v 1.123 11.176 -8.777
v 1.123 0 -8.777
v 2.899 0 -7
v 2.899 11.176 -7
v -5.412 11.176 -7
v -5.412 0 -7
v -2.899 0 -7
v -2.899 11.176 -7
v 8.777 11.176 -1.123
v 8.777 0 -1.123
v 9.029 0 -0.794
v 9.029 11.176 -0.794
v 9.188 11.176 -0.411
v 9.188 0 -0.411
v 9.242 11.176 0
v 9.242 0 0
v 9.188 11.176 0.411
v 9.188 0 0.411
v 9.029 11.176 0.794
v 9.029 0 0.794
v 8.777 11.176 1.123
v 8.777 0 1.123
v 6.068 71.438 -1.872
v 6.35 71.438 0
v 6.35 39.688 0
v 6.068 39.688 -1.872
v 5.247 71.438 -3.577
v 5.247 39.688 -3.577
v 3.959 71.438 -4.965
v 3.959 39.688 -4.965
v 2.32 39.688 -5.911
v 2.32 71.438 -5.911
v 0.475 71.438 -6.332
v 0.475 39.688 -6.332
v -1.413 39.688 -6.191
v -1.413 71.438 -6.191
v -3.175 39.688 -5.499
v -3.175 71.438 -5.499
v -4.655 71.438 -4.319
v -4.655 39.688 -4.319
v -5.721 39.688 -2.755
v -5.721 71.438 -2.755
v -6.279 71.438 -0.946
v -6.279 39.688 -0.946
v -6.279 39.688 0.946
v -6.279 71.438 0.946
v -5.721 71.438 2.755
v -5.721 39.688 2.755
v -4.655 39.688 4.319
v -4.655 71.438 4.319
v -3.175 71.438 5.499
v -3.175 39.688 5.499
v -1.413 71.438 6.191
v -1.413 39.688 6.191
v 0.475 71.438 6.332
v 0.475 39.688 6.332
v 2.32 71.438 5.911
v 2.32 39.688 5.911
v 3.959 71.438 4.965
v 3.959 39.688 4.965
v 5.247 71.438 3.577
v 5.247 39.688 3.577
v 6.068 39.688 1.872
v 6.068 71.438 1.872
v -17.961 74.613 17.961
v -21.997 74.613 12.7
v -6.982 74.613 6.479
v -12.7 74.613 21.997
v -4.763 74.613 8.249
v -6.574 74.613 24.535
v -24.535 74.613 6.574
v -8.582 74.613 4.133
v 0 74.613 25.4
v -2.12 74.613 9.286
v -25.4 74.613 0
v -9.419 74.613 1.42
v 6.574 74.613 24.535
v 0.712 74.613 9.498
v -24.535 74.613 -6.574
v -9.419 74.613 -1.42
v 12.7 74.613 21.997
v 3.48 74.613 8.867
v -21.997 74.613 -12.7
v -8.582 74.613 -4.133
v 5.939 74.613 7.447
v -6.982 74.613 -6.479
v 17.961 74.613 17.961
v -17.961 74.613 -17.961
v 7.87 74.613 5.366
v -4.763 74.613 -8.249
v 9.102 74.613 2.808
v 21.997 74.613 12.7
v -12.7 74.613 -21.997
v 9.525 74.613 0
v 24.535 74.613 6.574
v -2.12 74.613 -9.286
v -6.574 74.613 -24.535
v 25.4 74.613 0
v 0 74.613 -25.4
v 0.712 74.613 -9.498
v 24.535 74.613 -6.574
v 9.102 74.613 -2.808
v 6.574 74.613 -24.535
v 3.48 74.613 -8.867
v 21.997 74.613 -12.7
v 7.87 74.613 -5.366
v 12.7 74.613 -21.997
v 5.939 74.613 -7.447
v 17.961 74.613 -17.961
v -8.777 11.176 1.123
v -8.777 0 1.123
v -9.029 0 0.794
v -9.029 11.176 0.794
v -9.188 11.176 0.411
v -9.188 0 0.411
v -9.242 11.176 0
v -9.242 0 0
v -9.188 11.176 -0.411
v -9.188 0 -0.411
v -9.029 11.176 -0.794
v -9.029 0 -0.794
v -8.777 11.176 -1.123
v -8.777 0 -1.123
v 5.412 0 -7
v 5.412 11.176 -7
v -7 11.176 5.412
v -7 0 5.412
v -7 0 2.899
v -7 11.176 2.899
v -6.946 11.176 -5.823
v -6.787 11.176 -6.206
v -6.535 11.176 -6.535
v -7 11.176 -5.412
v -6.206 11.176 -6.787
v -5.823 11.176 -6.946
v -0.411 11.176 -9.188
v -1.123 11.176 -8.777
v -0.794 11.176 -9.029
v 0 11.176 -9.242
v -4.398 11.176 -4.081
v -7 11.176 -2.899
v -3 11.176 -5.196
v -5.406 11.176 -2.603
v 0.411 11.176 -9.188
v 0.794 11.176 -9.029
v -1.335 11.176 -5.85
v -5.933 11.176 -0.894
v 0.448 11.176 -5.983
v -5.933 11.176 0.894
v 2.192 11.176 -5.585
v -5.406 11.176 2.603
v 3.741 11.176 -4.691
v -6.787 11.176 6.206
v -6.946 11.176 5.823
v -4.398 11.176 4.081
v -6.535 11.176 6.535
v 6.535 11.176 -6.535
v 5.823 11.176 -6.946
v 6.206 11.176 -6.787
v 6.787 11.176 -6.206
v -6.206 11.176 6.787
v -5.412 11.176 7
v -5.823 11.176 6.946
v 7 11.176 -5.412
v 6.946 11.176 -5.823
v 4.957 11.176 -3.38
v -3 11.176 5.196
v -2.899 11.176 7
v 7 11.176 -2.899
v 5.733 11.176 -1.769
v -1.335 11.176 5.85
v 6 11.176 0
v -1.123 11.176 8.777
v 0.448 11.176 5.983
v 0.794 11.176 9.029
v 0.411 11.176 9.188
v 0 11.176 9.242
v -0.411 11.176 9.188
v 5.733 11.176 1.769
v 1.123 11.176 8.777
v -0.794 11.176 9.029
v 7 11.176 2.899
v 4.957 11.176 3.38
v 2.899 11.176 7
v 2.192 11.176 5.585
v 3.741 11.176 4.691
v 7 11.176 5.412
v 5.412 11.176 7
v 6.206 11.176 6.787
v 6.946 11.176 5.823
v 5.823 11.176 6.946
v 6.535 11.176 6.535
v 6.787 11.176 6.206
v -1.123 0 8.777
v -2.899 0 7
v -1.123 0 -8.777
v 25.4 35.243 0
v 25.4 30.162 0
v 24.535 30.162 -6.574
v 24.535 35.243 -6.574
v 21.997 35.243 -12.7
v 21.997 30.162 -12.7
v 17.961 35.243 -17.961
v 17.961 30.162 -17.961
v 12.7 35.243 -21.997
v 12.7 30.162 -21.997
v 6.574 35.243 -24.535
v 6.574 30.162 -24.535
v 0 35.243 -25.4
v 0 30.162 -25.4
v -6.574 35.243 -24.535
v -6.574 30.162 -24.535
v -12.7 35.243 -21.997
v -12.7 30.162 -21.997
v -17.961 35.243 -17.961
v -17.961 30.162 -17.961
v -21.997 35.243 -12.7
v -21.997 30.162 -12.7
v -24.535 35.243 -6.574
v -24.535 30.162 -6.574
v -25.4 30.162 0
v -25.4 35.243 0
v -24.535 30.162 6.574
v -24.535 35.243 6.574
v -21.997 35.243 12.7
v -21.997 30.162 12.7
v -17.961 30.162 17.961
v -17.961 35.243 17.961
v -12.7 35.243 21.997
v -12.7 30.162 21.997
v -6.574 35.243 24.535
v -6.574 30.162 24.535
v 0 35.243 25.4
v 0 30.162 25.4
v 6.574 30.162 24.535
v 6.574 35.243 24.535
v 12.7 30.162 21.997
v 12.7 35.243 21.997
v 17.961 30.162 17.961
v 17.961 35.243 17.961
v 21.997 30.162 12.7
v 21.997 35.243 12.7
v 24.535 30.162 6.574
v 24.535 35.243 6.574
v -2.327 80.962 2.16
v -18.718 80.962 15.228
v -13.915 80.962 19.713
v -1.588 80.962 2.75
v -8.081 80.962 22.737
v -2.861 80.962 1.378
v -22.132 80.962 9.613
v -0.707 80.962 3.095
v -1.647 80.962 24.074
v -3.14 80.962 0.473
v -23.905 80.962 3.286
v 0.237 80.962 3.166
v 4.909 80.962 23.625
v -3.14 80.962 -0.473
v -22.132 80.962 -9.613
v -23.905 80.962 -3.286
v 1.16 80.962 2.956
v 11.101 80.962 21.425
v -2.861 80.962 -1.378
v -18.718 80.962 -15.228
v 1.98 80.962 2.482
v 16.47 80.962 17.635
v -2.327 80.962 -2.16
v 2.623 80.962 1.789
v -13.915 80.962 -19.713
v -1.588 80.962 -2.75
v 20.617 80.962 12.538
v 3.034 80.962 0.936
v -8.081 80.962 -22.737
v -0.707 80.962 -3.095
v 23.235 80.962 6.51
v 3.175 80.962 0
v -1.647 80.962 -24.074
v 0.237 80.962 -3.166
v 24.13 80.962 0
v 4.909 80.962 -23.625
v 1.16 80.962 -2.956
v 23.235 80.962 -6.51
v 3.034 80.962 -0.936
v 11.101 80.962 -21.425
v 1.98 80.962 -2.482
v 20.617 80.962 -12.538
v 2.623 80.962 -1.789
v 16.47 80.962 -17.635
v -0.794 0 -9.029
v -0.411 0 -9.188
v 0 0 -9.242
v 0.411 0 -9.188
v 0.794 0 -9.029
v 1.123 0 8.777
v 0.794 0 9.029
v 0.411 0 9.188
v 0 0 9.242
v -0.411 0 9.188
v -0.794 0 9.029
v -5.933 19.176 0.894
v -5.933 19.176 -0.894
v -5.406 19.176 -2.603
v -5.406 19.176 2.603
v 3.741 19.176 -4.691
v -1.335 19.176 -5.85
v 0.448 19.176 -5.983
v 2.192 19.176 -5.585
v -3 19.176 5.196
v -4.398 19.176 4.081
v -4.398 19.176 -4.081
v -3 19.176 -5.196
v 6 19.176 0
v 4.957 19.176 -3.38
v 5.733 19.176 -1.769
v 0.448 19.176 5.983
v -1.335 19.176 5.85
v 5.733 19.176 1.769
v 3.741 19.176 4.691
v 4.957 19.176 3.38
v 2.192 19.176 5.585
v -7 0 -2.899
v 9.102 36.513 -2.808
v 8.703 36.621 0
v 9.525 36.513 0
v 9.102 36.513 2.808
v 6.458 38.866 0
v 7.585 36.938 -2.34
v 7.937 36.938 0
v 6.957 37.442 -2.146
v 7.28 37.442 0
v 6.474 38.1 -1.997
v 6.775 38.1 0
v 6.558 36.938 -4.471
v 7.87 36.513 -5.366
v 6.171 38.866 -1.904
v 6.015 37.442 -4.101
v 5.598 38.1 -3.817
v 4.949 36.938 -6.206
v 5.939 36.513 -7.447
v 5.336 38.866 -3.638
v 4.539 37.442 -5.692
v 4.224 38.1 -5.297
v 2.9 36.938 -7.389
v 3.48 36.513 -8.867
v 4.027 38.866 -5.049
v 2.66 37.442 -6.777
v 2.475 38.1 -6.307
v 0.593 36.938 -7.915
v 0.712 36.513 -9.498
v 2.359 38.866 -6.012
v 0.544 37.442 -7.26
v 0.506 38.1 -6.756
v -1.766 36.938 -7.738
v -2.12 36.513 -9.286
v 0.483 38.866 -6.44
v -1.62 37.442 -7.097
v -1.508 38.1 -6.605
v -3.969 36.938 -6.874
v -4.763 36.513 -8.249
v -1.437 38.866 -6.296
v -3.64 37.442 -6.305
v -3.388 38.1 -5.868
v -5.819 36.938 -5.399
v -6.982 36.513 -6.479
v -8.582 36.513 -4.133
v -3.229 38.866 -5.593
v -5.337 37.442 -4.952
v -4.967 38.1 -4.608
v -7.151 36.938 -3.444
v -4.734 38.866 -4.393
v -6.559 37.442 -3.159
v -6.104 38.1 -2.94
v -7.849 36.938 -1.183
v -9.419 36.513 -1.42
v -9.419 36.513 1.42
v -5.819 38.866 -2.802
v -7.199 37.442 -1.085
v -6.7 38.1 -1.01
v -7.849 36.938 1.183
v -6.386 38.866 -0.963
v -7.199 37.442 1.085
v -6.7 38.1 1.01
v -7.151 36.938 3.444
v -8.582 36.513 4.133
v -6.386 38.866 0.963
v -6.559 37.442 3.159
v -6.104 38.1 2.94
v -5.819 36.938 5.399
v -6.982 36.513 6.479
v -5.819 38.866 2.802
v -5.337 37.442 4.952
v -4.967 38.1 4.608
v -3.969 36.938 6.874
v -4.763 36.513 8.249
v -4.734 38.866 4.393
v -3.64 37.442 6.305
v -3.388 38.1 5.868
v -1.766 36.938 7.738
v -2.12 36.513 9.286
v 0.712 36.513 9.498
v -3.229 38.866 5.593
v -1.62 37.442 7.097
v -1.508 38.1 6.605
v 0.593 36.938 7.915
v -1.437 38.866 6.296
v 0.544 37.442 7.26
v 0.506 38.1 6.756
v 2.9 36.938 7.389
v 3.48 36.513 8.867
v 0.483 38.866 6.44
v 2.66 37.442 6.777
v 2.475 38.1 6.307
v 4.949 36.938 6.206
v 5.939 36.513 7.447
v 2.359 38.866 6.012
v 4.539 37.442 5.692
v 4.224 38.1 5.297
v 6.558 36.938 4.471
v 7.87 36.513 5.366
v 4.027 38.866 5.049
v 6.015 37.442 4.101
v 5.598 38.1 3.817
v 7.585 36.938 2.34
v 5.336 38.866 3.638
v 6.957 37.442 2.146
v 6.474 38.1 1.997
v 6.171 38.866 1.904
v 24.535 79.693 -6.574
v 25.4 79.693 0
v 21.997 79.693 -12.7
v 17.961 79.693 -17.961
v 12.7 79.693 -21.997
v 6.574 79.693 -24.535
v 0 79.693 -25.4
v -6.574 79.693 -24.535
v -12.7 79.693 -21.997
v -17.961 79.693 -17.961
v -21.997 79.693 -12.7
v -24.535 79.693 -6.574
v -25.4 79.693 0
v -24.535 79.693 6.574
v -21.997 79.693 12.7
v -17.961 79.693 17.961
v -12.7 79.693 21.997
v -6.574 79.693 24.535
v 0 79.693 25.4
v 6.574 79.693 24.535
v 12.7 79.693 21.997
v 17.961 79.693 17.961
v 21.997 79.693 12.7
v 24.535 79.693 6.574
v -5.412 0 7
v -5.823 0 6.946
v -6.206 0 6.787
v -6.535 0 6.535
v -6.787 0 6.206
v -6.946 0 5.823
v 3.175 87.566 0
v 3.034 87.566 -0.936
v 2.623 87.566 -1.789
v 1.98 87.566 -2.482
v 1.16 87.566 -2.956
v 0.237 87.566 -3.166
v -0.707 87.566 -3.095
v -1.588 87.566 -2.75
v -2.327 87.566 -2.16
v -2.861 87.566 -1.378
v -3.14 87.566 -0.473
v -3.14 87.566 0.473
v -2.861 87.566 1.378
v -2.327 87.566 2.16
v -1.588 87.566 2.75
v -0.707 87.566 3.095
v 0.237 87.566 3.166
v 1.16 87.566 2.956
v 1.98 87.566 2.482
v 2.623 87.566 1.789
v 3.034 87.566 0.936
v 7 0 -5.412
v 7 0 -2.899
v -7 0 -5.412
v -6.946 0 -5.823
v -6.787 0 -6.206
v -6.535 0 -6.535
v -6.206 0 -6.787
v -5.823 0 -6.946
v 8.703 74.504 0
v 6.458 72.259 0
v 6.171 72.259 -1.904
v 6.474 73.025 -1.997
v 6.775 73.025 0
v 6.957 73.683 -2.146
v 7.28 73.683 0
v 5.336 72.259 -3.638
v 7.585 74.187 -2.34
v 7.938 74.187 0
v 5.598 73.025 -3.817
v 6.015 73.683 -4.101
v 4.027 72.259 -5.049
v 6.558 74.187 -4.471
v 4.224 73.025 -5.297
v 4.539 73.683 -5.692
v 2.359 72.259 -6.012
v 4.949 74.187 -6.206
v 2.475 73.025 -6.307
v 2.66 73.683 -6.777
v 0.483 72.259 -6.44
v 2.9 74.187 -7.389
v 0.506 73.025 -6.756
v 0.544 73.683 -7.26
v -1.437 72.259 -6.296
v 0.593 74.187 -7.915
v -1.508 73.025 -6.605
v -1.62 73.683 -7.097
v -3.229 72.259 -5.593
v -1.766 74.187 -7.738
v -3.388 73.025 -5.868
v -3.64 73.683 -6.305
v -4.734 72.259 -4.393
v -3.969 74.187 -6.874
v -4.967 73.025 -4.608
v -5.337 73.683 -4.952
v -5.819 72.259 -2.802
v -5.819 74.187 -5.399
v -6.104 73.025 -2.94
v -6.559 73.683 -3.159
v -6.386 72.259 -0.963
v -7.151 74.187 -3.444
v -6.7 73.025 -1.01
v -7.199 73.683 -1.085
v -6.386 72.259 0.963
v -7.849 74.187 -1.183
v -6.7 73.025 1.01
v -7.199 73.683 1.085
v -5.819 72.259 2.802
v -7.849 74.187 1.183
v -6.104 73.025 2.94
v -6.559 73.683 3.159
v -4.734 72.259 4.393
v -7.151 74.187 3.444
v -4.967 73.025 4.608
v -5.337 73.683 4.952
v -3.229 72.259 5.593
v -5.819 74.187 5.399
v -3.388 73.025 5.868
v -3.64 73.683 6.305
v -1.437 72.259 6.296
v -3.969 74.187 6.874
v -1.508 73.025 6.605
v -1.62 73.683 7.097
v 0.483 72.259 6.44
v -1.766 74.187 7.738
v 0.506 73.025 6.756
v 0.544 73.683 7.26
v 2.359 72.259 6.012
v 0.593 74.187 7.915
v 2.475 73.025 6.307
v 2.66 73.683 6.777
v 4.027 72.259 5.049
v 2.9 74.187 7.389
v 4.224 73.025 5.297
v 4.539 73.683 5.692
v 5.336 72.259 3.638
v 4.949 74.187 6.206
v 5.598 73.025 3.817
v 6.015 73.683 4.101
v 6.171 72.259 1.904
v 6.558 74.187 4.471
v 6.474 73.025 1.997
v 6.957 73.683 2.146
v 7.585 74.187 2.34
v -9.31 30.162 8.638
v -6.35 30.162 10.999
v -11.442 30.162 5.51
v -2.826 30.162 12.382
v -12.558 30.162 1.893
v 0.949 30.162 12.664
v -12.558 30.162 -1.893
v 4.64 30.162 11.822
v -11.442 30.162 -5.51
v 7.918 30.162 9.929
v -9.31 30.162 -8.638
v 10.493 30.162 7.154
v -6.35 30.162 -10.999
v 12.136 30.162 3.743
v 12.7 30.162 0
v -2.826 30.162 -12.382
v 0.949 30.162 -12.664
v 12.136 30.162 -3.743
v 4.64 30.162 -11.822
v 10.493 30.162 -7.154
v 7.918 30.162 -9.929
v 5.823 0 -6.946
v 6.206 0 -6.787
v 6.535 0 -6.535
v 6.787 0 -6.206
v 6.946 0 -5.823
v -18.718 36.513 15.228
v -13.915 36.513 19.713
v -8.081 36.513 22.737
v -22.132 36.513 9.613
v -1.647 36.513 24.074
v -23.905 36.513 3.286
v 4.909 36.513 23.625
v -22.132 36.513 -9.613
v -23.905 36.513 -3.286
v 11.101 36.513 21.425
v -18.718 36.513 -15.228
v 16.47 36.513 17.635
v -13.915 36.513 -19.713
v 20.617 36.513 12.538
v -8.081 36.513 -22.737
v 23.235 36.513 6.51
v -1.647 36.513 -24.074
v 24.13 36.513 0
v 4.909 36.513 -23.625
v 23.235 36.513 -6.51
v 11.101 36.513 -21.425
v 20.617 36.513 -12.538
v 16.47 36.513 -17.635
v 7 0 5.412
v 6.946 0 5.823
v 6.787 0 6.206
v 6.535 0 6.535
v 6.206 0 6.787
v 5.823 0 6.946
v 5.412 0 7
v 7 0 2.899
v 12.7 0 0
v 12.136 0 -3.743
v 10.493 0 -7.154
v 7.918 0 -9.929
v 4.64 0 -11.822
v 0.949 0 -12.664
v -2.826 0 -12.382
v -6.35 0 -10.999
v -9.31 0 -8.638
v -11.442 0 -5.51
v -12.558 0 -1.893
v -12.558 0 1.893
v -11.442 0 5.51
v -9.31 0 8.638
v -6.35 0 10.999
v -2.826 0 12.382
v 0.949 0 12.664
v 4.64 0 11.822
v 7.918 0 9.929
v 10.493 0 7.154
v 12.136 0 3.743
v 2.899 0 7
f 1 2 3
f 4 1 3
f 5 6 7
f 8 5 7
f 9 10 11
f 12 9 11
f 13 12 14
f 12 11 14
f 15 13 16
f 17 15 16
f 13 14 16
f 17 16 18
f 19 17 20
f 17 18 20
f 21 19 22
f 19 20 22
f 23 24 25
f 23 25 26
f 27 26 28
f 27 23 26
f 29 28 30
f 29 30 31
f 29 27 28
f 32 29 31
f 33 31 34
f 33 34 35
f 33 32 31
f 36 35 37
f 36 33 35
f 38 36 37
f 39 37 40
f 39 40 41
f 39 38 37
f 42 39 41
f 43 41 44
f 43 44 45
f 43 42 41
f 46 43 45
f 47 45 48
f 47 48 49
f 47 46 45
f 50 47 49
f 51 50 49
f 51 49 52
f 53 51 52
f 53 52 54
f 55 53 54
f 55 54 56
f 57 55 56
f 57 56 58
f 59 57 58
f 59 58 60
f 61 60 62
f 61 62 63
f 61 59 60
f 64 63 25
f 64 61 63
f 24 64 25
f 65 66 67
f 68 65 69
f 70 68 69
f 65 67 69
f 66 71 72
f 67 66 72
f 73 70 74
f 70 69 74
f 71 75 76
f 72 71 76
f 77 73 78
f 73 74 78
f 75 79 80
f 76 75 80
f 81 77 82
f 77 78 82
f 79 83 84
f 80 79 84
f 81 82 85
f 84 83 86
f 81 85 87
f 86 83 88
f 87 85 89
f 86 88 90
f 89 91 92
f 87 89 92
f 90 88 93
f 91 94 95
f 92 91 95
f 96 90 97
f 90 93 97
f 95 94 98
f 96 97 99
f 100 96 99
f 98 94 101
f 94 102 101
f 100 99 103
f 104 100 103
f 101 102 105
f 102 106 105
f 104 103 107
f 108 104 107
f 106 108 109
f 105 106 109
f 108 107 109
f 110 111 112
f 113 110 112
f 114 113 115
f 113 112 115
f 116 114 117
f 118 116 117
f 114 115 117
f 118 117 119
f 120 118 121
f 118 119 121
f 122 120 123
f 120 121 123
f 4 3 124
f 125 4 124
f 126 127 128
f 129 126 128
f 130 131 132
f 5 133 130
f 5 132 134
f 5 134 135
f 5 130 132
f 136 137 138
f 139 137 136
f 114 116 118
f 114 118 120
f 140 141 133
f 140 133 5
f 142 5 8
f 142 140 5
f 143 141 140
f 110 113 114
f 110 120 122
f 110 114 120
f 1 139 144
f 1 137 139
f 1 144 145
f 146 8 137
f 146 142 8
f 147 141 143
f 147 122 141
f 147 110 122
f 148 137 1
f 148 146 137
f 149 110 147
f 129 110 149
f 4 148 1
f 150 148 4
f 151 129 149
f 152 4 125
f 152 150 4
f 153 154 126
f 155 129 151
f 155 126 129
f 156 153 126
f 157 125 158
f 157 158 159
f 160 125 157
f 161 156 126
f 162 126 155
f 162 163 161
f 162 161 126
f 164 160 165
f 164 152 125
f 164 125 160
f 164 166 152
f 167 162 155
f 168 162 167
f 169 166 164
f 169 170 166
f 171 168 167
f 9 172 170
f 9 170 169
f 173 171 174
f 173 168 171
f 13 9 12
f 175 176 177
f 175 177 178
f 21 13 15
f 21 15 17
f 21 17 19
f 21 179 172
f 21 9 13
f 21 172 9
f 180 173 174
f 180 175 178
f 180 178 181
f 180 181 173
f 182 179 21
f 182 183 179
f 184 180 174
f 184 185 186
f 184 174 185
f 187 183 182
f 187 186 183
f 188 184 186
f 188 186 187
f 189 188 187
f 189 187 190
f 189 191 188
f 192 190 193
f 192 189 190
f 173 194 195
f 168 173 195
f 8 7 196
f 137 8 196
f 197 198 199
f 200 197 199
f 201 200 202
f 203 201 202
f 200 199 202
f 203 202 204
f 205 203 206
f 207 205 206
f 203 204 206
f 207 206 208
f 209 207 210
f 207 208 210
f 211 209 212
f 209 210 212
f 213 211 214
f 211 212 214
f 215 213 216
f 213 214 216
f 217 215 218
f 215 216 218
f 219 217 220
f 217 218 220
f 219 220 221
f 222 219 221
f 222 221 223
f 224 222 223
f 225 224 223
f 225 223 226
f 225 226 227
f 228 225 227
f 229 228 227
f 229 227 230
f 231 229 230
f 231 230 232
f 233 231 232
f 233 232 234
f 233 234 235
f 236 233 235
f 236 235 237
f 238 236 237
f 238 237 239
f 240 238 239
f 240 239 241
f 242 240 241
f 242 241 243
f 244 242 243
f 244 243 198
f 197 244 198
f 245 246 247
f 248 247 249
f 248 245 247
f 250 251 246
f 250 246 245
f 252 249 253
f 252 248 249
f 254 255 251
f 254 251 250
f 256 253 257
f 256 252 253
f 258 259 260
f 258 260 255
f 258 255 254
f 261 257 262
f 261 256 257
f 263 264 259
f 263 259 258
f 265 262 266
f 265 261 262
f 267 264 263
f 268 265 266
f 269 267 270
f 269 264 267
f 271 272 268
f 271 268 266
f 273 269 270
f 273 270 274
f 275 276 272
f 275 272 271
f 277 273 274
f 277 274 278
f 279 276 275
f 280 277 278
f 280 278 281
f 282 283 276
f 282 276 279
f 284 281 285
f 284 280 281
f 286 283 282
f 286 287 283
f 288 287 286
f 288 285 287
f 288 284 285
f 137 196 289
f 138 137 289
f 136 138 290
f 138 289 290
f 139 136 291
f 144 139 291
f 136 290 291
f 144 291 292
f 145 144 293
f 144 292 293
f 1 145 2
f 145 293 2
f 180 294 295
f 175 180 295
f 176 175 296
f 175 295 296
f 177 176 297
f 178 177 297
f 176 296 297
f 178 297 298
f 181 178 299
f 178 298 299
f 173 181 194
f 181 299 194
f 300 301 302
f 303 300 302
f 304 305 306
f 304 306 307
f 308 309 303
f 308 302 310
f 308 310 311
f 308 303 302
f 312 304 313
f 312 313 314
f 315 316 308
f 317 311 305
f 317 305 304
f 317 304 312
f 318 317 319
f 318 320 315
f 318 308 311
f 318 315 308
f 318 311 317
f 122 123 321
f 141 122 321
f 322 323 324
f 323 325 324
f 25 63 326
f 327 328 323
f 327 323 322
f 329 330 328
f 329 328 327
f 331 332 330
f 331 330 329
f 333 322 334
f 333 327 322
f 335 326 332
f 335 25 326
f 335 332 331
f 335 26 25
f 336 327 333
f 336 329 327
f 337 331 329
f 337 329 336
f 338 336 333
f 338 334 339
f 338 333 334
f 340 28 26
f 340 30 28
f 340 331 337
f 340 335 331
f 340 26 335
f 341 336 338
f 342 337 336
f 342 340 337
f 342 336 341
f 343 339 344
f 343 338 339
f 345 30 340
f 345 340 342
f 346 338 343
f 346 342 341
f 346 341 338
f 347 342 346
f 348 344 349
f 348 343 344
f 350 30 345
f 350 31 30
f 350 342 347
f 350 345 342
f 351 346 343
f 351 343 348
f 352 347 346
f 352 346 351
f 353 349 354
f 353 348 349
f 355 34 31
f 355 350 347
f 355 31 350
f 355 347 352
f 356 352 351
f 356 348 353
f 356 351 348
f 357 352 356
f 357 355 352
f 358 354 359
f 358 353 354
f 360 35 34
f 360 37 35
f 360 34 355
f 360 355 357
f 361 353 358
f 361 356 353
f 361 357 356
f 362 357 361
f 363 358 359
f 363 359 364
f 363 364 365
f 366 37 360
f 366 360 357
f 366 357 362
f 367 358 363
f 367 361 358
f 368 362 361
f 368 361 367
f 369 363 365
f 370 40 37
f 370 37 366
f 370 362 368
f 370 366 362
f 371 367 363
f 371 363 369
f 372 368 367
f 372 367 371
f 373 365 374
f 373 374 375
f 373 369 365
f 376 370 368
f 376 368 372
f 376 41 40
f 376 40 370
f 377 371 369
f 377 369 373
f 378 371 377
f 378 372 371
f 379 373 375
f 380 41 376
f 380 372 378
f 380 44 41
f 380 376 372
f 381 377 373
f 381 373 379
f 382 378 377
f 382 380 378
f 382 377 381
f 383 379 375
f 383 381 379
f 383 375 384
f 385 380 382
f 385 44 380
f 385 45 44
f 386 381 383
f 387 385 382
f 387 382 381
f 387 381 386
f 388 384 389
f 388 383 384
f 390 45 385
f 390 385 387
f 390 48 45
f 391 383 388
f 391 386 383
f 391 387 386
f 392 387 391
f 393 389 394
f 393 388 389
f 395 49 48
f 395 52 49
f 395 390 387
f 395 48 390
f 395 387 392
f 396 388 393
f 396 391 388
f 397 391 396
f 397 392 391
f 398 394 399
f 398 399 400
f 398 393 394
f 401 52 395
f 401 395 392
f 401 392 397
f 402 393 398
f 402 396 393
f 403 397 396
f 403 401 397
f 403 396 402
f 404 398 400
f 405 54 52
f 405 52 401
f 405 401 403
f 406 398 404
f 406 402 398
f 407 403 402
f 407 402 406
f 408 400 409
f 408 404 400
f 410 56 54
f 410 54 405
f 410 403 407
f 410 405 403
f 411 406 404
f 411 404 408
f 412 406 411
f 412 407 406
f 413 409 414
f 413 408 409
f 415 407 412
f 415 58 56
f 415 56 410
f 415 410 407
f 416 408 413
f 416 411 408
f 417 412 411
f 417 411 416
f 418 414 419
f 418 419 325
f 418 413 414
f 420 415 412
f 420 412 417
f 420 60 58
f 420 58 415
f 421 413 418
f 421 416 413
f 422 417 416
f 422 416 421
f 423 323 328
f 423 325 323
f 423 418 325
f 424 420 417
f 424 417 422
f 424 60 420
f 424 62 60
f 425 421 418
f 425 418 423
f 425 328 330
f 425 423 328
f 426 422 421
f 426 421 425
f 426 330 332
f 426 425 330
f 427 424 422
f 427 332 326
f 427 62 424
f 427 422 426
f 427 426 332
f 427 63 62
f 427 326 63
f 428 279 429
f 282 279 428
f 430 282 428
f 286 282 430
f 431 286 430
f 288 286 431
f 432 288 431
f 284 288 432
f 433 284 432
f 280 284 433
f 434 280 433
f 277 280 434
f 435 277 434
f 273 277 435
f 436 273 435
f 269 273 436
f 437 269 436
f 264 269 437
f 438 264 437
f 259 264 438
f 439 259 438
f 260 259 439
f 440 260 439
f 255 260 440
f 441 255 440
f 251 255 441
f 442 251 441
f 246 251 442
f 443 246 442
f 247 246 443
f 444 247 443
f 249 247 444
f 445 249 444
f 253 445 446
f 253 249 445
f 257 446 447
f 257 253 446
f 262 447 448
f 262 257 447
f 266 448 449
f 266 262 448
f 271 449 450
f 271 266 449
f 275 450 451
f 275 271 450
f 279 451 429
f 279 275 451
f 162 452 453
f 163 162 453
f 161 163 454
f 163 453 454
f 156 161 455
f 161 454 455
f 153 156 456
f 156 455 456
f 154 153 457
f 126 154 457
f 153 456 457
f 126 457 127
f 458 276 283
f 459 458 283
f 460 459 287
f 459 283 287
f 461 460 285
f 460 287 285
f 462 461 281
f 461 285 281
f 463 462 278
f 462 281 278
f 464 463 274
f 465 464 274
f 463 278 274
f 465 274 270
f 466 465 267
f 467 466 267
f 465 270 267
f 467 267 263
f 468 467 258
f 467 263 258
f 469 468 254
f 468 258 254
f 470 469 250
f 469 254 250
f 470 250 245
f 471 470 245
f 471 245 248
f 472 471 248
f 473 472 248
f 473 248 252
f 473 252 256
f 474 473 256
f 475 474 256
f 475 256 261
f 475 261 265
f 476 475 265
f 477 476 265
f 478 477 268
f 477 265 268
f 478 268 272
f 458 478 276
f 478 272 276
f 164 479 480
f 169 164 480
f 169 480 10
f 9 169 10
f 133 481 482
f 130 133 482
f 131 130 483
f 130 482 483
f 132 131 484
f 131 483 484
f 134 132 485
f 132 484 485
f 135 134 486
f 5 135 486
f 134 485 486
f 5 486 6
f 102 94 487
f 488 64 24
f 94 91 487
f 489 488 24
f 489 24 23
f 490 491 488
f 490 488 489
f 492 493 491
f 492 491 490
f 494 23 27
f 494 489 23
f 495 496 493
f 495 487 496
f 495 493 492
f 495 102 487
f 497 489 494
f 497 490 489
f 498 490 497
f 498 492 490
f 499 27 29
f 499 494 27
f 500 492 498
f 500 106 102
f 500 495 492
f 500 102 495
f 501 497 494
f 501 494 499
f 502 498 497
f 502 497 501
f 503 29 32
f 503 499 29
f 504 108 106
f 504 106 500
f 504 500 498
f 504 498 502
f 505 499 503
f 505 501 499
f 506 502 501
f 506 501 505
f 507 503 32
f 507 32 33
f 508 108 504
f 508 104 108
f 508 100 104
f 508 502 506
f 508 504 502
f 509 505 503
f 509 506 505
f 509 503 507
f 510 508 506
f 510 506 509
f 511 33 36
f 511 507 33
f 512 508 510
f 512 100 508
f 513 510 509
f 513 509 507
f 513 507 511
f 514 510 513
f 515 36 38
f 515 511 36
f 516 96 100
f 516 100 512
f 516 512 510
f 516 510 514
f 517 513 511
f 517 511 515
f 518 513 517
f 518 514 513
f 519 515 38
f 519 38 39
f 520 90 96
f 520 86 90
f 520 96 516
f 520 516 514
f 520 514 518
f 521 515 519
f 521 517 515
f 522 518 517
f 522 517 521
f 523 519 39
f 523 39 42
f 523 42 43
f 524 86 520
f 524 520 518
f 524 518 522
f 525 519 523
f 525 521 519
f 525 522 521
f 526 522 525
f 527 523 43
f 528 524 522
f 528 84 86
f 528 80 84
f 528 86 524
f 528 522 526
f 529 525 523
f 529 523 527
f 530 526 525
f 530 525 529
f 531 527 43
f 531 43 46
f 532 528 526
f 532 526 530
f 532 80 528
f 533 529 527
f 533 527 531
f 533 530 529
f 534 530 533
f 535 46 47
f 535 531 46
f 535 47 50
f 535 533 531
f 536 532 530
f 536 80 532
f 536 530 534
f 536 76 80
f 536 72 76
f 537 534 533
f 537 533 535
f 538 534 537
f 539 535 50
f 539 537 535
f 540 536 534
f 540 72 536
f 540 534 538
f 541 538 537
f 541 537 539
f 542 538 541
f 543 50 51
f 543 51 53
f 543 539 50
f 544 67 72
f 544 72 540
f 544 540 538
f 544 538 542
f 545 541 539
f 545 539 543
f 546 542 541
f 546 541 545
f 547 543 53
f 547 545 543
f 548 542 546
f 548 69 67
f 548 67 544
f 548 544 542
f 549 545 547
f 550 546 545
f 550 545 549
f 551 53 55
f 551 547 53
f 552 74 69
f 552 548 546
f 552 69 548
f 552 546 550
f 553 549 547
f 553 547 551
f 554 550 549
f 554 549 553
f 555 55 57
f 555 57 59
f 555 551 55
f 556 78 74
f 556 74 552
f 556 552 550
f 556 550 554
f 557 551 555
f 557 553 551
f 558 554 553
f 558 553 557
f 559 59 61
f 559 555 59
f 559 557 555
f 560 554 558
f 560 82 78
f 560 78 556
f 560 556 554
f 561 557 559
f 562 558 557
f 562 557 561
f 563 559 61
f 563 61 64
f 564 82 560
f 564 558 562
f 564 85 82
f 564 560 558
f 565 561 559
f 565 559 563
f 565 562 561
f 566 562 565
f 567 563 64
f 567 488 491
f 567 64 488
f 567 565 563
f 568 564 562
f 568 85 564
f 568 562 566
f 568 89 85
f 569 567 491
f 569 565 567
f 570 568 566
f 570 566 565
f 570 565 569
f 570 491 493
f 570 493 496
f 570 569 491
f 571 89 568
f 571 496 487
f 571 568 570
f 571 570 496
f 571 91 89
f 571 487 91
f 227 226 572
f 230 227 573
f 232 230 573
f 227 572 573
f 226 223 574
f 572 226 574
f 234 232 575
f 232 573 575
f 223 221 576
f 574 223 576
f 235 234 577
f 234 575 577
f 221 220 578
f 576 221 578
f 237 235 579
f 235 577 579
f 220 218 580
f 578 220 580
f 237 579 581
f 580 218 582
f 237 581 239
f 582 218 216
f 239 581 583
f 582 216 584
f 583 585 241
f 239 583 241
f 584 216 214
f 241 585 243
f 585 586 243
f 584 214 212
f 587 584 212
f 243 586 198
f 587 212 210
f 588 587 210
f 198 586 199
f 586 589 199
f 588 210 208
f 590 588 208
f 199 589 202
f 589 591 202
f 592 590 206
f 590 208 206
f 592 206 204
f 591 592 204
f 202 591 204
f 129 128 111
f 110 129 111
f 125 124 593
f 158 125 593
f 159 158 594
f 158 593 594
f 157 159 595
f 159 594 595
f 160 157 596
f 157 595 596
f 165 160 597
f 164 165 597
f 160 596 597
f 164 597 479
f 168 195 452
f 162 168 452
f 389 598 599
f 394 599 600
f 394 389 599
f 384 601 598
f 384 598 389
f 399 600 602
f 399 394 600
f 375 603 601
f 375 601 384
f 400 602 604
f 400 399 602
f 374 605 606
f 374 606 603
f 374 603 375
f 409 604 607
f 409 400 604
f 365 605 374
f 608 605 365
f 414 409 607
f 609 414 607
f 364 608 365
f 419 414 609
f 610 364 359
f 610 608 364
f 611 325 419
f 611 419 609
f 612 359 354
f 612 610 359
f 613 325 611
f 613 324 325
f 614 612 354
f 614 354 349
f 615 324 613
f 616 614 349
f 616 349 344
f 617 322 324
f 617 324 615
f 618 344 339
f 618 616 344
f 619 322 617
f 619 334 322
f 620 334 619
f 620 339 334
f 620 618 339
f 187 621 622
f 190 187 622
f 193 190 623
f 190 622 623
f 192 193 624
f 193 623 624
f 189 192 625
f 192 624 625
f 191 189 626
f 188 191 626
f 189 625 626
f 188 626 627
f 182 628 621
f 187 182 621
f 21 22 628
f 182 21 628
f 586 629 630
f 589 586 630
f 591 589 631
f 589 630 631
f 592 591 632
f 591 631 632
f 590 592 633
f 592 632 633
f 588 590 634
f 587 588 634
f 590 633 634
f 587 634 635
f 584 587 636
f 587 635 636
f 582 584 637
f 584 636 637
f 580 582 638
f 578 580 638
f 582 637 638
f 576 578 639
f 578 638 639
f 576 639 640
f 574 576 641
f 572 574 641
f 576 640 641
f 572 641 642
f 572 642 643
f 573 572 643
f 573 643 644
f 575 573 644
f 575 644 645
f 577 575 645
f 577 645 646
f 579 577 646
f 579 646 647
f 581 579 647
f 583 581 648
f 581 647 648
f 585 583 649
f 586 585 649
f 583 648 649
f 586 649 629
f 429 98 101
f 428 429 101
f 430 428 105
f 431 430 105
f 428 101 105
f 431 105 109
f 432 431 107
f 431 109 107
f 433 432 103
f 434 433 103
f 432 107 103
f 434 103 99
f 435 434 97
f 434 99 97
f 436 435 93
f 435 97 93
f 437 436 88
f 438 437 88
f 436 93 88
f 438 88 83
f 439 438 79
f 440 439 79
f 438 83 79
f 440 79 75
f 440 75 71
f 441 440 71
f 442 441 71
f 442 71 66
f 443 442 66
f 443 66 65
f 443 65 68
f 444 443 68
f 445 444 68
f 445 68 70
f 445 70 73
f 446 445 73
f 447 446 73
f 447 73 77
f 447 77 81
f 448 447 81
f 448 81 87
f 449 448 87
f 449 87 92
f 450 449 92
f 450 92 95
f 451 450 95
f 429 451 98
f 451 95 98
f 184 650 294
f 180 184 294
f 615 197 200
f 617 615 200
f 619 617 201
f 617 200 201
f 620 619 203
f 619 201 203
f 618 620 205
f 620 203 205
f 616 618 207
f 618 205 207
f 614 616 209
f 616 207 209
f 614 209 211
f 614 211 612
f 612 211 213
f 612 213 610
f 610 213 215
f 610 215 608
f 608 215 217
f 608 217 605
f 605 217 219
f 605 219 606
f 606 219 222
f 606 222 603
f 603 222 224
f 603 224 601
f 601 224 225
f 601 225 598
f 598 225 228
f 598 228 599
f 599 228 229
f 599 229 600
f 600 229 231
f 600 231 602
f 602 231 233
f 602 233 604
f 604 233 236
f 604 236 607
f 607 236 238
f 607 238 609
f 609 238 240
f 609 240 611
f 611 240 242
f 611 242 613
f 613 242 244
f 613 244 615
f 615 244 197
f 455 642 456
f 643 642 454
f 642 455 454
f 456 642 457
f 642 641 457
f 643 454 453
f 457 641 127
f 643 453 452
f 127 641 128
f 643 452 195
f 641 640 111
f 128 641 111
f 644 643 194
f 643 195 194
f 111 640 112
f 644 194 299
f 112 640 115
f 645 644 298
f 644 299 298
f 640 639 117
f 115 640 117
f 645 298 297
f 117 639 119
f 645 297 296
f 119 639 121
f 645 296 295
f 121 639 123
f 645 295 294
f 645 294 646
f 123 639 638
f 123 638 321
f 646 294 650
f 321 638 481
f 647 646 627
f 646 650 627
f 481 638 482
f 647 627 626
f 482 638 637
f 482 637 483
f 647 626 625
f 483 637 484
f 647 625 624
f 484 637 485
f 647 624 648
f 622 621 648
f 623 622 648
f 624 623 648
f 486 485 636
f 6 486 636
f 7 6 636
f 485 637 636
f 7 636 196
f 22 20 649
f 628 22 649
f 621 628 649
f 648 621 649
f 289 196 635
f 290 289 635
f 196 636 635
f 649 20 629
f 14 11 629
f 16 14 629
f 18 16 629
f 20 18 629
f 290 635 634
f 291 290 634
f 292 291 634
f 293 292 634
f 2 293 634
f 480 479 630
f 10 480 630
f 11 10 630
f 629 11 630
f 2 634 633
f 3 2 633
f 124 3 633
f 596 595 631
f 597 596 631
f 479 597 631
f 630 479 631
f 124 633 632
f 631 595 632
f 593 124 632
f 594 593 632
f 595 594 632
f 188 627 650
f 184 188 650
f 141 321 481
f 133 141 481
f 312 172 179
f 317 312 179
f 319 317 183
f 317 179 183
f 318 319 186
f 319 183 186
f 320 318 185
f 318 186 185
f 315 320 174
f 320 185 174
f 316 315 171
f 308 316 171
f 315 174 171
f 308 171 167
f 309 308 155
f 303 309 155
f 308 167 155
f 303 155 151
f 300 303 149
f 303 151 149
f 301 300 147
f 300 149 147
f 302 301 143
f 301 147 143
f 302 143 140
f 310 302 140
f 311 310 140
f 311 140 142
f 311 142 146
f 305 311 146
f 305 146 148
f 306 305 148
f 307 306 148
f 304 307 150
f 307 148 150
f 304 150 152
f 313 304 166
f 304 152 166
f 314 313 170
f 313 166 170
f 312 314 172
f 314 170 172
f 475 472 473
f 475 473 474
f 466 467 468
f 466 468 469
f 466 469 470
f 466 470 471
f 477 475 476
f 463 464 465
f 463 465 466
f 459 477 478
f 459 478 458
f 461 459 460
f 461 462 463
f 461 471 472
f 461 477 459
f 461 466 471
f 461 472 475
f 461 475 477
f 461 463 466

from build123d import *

# Parameters (mm, degrees)
SKETCH1_R           = 12.7
BOSS_EXTRUDE1_DEPTH = 30.1625
SKETCH4_R           = 25.4
BOSS_EXTRUDE2_DEPTH = 50.8
CUT_EXTRUDE1_DEPTH  = 11.176
SKETCH3_R           = 6
CUT_EXTRUDE2_DEPTH  = 8
SKETCH5_R           = 3.175
BOSS_EXTRUDE3_DEPTH = 6.604
CUT_EXTRUDE3_START  = -6.35
SKETCH9_R           = 25.4
SKETCH9_R_2         = 6.35
CUT_EXTRUDE3_DEPTH  = 38.1
FILLET1_R           = 3.175
CHAMFER1_SIZE       = 1.27


with BuildPart() as part:
    # Sketch1 → Boss-Extrude1 (new body)
    with BuildSketch(Plane(origin=(0, 0, 0), x_dir=(1, 0, 0), z_dir=(0, 1, 0))):
        Circle(SKETCH1_R)
    extrude(amount=BOSS_EXTRUDE1_DEPTH)

    # Sketch4 → Boss-Extrude2 (add)
    with BuildSketch(Plane(origin=(0, 30.1625, 0), x_dir=(1, 0, 0), z_dir=(0, 1, 0))):
        Circle(SKETCH4_R)
    extrude(amount=BOSS_EXTRUDE2_DEPTH)

    # Sketch2 → Cut-Extrude1 (cut)
    with BuildSketch(Plane.XZ):
        with BuildLine():
            Line((-7, 2.899494937), (-8.776962921, 1.122532015))
            ThreePointArc((-8.776962921, 1.122532015), (-9.241930906, 0), (-8.776962921, -1.122532015))
            Line((-8.776962921, -1.122532015), (-7, -2.899494937))
            Line((-7, -2.899494937), (-7, 2.899494937))
        make_face()
        Polygon((-2.899494937, 7), (-7, 2.899494937), (-7, -2.899494937), (-2.899494937, -7), (2.899494937, -7), (7, -2.899494937), (7, 2.899494937), (2.899494937, 7), align=None)
        with BuildLine():
            Line((-7, 5.4125), (-7, 2.899494937))
            Line((-7, 2.899494937), (-2.899494937, 7))
            Line((-2.899494937, 7), (-5.4125, 7))
            ThreePointArc((-5.4125, 7), (-6.535032015, 6.535032015), (-7, 5.4125))
        make_face()
        with BuildLine():
            Line((-1.122532015, 8.776962921), (-2.899494937, 7))
            Line((-2.899494937, 7), (2.899494937, 7))
            Line((2.899494937, 7), (1.122532015, 8.776962921))
            ThreePointArc((1.122532015, 8.776962921), (0, 9.241930906), (-1.122532015, 8.776962921))
        make_face()
        with BuildLine():
            Line((5.4125, 7), (2.899494937, 7))
            Line((2.899494937, 7), (7, 2.899494937))
            Line((7, 2.899494937), (7, 5.4125))
            ThreePointArc((7, 5.4125), (6.535032015, 6.535032015), (5.4125, 7))
        make_face()
        with BuildLine():
            Line((8.776962921, 1.122532015), (7, 2.899494937))
            Line((7, 2.899494937), (7, -2.899494937))
            Line((7, -2.899494937), (8.776962921, -1.122532015))
            ThreePointArc((8.776962921, -1.122532015), (9.241930906, 0), (8.776962921, 1.122532015))
        make_face()
        with BuildLine():
            Line((7, -2.899494937), (2.899494937, -7))
            Line((2.899494937, -7), (5.4125, -7))
            ThreePointArc((5.4125, -7), (6.535032015, -6.535032015), (7, -5.4125))
            Line((7, -5.4125), (7, -2.899494937))
        make_face()
        with BuildLine():
            Line((2.899494937, -7), (-2.899494937, -7))
            Line((-2.899494937, -7), (-1.122532015, -8.776962921))
            ThreePointArc((-1.122532015, -8.776962921), (0, -9.241930906), (1.122532015, -8.776962921))
            Line((1.122532015, -8.776962921), (2.899494937, -7))
        make_face()
        with BuildLine():
            Line((-2.899494937, -7), (-7, -2.899494937))
            Line((-7, -2.899494937), (-7, -5.4125))
            ThreePointArc((-7, -5.4125), (-6.535032015, -6.535032015), (-5.4125, -7))
            Line((-5.4125, -7), (-2.899494937, -7))
        make_face()
    extrude(amount=-CUT_EXTRUDE1_DEPTH, mode=Mode.SUBTRACT)

    # Sketch3 → Cut-Extrude2 (cut)
    with BuildSketch(Plane.XZ.offset(-11.176)):
        Circle(SKETCH3_R)
    extrude(amount=-CUT_EXTRUDE2_DEPTH, mode=Mode.SUBTRACT)

    # Sketch5 → Boss-Extrude3 (add)
    with BuildSketch(Plane(origin=(0, 80.9625, 0), x_dir=(1, 0, 0), z_dir=(0, 1, 0))):
        Circle(SKETCH5_R)
    extrude(amount=BOSS_EXTRUDE3_DEPTH)

    # Sketch9 → Cut-Extrude3 (cut)
    with BuildSketch(Plane(origin=(0, 80.9625, 0), x_dir=(1, 0, 0), z_dir=(0, 1, 0)).offset(CUT_EXTRUDE3_START)):
        Circle(SKETCH9_R)
        Circle(SKETCH9_R_2, mode=Mode.SUBTRACT)
    extrude(amount=-CUT_EXTRUDE3_DEPTH, mode=Mode.SUBTRACT)

    # Fillet1
    fillet1_edges = [part.edges().sort_by_distance(p)[0] for p in [
        (-6.35, 36.5125, 0),
        (-6.35, 74.6125, 0),
    ]]
    fillet(fillet1_edges, radius=FILLET1_R)

    # Chamfer1
    chamfer1_edges = [part.edges().sort_by_distance(p)[0] for p in [
        (-25.4, 80.9625, 0),
        (-25.4, 36.5125, 0),
    ]]
    chamfer(chamfer1_edges, length=CHAMFER1_SIZE)


solid = part.part
